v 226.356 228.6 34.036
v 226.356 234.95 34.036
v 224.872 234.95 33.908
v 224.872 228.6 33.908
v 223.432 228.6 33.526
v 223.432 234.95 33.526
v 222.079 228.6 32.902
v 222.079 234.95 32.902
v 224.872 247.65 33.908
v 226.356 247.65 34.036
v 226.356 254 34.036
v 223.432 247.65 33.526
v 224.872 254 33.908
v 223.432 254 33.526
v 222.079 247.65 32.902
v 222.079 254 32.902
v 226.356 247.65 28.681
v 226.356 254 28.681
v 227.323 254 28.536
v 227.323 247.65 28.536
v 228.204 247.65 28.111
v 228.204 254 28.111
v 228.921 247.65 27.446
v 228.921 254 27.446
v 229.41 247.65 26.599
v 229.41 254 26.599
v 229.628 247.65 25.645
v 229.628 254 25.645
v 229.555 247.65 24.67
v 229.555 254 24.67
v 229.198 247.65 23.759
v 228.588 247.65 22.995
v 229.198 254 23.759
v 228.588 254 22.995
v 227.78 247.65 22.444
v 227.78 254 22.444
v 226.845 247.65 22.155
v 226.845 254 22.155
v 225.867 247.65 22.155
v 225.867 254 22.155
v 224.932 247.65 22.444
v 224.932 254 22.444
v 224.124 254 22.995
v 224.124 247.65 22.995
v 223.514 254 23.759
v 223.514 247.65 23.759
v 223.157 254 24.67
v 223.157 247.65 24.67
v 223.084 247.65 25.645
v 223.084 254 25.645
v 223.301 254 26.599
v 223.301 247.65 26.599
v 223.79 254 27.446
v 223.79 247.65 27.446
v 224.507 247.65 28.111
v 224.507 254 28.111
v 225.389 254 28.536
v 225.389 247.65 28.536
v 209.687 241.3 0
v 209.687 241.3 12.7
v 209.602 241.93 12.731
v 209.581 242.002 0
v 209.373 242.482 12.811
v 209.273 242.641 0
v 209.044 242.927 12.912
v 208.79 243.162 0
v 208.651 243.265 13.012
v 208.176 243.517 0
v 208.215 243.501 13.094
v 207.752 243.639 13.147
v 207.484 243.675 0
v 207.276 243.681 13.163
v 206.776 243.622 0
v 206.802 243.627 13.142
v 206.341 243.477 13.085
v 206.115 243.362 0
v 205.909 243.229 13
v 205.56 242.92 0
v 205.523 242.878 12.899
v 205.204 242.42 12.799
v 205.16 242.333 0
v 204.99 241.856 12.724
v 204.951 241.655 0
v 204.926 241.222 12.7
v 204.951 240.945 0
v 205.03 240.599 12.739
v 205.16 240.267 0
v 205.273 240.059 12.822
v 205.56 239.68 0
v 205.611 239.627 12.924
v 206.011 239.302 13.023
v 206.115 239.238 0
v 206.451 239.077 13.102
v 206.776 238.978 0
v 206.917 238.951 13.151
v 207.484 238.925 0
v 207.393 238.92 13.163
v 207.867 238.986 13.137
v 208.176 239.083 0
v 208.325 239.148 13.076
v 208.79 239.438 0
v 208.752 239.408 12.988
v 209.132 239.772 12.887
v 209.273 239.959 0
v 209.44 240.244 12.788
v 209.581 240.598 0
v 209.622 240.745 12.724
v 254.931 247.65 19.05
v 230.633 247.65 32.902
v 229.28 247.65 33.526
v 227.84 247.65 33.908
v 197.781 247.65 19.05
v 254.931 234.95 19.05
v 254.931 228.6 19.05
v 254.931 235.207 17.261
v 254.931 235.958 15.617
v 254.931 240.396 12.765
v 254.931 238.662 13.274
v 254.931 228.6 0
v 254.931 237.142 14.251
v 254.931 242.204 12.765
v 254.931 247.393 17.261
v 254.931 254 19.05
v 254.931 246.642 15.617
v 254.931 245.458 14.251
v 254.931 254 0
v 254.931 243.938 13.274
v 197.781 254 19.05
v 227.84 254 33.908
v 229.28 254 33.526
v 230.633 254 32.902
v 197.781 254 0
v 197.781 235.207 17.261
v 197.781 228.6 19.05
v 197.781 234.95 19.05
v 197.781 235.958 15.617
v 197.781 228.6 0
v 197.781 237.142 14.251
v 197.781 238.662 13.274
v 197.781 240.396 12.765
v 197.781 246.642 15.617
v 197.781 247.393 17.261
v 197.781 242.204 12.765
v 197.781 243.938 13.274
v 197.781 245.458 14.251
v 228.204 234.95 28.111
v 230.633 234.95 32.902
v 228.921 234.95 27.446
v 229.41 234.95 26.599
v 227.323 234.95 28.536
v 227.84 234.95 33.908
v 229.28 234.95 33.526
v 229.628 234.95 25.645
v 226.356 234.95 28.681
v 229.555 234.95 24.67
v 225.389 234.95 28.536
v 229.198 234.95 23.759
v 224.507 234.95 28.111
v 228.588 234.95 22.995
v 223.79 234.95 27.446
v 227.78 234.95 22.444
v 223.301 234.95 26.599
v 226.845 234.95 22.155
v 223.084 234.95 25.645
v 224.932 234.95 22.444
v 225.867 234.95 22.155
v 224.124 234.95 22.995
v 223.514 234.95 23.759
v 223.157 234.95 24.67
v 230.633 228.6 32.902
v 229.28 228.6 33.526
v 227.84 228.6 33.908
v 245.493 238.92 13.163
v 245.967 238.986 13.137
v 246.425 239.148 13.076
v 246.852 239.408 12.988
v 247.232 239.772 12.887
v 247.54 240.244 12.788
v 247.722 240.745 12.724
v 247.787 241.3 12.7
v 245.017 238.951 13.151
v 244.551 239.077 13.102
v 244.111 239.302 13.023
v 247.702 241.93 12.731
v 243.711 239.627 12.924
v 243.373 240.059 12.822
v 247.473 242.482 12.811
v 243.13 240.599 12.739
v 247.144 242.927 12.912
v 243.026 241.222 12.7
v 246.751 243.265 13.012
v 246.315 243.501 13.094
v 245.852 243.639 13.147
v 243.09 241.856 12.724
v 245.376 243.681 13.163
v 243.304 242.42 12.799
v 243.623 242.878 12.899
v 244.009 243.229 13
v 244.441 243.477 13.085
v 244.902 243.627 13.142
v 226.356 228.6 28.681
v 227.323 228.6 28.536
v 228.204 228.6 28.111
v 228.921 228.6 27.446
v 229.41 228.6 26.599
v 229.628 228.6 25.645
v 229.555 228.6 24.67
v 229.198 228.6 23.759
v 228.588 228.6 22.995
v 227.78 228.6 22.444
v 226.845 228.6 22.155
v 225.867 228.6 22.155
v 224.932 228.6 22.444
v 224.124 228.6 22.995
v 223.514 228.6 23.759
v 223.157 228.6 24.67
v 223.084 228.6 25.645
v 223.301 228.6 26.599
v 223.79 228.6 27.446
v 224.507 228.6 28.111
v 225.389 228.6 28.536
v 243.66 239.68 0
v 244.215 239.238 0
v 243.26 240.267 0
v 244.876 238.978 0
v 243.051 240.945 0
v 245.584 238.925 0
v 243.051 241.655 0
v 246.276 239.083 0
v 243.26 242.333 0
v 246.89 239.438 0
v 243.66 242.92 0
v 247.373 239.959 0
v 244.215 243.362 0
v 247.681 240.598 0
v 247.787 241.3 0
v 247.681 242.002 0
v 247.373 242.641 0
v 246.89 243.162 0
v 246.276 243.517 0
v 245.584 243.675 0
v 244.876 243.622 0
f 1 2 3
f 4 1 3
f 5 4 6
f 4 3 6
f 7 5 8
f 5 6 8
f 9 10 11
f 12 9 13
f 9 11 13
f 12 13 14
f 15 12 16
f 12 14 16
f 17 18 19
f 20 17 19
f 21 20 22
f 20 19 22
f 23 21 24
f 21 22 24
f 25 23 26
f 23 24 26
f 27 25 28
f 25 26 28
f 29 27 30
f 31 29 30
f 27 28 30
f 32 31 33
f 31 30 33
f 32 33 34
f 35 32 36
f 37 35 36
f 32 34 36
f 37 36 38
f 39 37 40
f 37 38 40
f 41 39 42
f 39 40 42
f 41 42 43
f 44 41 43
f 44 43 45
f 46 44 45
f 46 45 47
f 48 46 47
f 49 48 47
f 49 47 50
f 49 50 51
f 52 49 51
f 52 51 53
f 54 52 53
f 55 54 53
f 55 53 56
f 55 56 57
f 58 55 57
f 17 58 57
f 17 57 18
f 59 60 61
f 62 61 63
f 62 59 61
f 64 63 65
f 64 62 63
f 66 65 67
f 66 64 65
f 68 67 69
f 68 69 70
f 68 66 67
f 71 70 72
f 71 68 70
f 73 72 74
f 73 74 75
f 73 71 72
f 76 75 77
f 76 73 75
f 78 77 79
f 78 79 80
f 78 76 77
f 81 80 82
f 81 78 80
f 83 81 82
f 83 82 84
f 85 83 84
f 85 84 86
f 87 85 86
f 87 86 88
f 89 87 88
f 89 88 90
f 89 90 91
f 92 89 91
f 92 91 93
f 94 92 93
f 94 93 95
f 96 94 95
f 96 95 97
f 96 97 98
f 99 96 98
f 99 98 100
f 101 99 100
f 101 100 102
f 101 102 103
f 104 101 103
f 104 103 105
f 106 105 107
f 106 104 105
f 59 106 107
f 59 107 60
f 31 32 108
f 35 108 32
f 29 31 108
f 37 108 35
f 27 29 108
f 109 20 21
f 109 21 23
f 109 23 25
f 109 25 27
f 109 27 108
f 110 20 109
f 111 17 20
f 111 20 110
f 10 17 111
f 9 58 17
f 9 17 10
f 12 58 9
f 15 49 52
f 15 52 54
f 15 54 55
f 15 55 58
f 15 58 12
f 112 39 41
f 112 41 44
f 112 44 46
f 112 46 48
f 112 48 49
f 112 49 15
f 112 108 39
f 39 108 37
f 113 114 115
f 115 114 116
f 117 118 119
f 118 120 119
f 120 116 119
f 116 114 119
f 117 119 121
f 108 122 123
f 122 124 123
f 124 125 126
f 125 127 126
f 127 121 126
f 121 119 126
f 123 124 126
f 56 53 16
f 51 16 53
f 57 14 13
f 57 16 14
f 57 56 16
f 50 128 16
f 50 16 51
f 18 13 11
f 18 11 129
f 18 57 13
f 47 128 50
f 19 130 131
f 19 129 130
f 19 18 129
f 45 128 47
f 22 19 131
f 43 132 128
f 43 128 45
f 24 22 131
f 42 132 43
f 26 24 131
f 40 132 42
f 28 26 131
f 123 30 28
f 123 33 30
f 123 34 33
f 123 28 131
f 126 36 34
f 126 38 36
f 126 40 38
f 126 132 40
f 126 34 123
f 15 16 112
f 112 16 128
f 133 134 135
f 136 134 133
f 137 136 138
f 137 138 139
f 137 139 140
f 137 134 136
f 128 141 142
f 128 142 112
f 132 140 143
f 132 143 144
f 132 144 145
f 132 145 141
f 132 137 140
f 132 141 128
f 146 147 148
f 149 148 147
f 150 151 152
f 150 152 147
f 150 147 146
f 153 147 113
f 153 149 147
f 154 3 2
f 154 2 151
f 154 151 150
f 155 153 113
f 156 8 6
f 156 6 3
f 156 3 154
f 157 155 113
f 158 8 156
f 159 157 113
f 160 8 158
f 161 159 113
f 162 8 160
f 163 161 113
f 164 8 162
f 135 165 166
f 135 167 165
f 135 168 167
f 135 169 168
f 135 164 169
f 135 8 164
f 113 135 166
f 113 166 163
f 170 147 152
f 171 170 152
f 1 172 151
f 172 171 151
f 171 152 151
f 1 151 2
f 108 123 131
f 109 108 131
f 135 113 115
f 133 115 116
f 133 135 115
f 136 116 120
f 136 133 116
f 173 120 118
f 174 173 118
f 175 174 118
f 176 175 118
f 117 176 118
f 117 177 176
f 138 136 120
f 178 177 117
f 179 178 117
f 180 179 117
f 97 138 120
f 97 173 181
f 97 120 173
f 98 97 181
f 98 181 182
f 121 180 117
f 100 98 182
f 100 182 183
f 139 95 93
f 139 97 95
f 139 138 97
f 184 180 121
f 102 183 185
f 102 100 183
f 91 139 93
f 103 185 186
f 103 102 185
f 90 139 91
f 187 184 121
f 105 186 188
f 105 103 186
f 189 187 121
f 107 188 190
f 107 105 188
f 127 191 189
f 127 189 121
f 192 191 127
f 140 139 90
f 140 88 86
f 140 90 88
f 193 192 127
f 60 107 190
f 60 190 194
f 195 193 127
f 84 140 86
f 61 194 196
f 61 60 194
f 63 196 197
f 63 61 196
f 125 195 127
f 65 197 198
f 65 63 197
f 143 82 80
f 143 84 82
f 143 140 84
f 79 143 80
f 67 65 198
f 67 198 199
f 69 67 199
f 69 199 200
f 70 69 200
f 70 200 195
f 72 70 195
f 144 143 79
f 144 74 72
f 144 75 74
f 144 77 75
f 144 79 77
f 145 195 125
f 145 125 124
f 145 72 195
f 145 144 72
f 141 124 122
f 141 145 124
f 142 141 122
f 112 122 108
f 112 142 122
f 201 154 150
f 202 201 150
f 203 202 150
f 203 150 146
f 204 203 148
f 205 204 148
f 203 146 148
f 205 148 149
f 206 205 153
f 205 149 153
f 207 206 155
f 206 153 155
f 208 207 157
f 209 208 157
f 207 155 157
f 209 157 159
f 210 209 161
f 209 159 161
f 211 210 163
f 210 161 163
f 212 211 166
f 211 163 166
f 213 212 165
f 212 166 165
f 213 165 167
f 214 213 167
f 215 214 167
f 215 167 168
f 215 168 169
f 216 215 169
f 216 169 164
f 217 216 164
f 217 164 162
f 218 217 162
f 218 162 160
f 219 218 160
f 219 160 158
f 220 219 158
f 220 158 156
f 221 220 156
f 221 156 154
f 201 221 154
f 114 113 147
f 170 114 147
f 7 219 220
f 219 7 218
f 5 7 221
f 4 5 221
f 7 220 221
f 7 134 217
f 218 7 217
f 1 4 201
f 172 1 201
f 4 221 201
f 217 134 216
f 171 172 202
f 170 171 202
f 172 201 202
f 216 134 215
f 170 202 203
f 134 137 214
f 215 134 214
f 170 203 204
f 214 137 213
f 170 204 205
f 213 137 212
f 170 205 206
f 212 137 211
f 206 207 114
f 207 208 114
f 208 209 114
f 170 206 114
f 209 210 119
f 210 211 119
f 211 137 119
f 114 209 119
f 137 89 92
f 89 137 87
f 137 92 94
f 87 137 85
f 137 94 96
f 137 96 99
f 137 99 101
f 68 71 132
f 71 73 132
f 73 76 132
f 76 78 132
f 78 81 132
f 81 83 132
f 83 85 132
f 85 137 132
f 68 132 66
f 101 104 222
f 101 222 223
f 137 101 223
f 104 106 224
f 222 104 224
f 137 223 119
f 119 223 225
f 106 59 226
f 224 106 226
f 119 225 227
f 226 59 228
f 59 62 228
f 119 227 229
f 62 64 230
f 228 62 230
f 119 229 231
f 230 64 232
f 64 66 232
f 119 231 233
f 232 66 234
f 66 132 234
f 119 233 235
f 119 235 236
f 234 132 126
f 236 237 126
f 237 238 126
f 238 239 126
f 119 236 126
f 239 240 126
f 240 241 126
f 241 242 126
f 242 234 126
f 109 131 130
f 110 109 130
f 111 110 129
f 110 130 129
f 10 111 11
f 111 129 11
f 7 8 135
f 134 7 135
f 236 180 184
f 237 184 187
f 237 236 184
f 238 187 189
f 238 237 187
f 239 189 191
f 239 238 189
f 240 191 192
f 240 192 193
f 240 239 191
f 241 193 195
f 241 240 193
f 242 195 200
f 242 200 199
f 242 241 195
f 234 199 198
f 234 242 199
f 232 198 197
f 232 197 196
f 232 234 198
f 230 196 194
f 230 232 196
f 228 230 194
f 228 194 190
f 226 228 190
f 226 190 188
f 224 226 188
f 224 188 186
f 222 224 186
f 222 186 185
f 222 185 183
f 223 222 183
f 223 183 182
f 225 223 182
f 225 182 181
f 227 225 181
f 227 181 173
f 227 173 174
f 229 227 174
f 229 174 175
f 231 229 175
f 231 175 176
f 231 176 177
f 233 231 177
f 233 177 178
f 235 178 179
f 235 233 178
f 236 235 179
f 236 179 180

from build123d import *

# Parameters (mm, degrees)
SKETCH1_W           = 57.15
SKETCH1_H           = 25.4
SKETCH1_R           = 2.38125
BOSS_EXTRUDE1_DEPTH = 34.036
SKETCH2_R           = 3.281447176
CUT_EXTRUDE1_DEPTH  = 259.444021221
CUT_EXTRUDE2_DEPTH  = 263.565366711


with BuildPart() as part:
    # Sketch1 → Boss-Extrude1 (new body)
    with BuildSketch(Plane.XY):
        with Locations((226.355780427, 241.3)):
            Rectangle(SKETCH1_W, SKETCH1_H)
        with Locations((245.405780427, 241.3)):
            Circle(SKETCH1_R, mode=Mode.SUBTRACT)
        with Locations((207.305780427, 241.3)):
            Circle(SKETCH1_R, mode=Mode.SUBTRACT)
    extrude(amount=BOSS_EXTRUDE1_DEPTH)

    # Sketch2 → Cut-Extrude1 (cut, through all)
    with BuildSketch(Plane(origin=(0, 254, 0), x_dir=(1, 0, 0), z_dir=(0, 1, 0))):
        with BuildLine():
            Line((254.930780427, -34.036), (254.930780427, -19.05))
            Line((254.930780427, -19.05), (230.6329732, -32.902407479))
            ThreePointArc((230.6329732, -32.902407479), (228.568211783, -33.747792732), (226.355780427, -34.036))
            Line((226.355780427, -34.036), (254.930780427, -34.036))
        make_face()
        with BuildLine():
            Line((197.780780427, -34.036), (226.355780427, -34.036))
            ThreePointArc((226.355780427, -34.036), (224.143349071, -33.747792732), (222.078587654, -32.902407479))
            Line((222.078587654, -32.902407479), (197.780780427, -19.05))
            Line((197.780780427, -19.05), (197.780780427, -34.036))
        make_face()
        Polygon((226.681841891, -42.314106695), (197.780780427, -34.036), (254.930780427, -34.036), align=None)
        with Locations(Location((226.355780427, -25.4, 0), (0, 0, 270))):
            Circle(SKETCH2_R)
    extrude(amount=-CUT_EXTRUDE1_DEPTH, mode=Mode.SUBTRACT)

    # Sketch3 → Cut-Extrude2 (cut, through all)
    with BuildSketch(Plane.ZY.offset(-197.780780427)):
        with BuildLine():
            Line((19.05, 247.65), (49.022, 247.65))
            ThreePointArc((49.022, 247.65), (55.372, 241.3), (49.022, 234.95))
            Line((49.022, 234.95), (19.05, 234.95))
            ThreePointArc((19.05, 234.95), (12.7, 241.3), (19.05, 247.65))
        make_face()
    extrude(amount=-CUT_EXTRUDE2_DEPTH, mode=Mode.SUBTRACT)


solid = part.part
